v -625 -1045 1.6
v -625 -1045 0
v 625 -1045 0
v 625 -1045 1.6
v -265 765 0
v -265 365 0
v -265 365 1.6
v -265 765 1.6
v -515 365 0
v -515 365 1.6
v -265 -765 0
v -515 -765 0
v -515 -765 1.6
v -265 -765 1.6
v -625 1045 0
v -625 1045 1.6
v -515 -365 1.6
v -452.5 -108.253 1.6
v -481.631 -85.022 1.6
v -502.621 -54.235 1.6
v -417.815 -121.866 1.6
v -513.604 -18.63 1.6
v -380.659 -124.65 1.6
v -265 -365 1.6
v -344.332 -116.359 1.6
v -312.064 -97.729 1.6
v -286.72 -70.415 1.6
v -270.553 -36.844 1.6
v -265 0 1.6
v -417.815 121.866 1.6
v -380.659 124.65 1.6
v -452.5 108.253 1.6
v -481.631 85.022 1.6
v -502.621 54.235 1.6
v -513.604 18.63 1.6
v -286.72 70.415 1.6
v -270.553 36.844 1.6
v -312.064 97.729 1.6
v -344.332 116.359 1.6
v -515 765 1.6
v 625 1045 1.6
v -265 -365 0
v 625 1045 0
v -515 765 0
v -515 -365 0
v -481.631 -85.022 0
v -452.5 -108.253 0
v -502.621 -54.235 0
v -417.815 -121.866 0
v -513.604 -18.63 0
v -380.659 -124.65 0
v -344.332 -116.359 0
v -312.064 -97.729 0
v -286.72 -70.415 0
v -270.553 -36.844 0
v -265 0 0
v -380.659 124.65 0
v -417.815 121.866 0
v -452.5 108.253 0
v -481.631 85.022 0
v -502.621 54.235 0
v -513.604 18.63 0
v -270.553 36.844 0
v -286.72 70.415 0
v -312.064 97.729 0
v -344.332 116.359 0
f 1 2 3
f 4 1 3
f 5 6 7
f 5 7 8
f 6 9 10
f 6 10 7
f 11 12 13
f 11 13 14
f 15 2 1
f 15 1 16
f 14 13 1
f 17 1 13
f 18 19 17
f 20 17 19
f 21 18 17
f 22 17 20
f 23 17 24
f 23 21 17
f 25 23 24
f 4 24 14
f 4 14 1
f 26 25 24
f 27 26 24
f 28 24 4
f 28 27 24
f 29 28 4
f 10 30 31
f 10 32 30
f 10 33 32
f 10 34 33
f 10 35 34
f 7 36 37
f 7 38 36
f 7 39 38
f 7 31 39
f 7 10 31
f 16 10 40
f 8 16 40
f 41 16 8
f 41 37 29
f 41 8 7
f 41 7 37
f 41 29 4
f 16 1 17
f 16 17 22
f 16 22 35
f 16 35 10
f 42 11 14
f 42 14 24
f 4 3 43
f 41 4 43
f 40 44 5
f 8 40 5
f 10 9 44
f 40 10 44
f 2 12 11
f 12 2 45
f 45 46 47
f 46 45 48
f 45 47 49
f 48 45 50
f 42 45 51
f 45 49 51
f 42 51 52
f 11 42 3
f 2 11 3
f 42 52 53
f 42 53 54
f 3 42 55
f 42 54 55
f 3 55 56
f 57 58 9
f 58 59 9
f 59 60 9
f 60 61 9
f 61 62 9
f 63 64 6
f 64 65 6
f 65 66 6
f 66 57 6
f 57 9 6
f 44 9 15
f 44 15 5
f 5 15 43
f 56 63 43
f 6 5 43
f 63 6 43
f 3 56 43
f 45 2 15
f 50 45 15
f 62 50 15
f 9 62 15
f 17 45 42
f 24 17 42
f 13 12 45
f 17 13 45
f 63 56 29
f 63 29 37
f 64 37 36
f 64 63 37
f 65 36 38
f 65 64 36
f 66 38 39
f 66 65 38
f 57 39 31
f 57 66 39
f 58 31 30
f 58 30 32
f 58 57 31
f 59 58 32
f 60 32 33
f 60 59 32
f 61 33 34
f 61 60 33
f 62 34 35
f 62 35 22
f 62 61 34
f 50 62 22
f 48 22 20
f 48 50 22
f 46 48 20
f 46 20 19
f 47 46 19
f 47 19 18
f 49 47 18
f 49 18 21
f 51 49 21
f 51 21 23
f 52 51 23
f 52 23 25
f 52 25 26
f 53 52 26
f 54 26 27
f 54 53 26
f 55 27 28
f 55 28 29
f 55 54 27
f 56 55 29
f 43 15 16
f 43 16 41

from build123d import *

# Parameters (mm, degrees)
F0_W     = 1250
F0_H     = 2090
F0_W_2   = 250
F0_H_2   = 400
F0_R     = 125
F1_DEPTH = 1.6


with BuildPart() as f1:
    # F0 (on Top) → F1 (new body)
    with BuildSketch(Plane.XY):
        Rectangle(F0_W, F0_H)
        with Locations((-390, -565)):
            Rectangle(F0_W_2, F0_H_2, mode=Mode.SUBTRACT)
        with Locations((-390, 0)):
            Circle(F0_R, mode=Mode.SUBTRACT)
        with Locations((-390, 565)):
            Rectangle(F0_W_2, F0_H_2, mode=Mode.SUBTRACT)
    extrude(amount=F1_DEPTH)


solid = f1.part
